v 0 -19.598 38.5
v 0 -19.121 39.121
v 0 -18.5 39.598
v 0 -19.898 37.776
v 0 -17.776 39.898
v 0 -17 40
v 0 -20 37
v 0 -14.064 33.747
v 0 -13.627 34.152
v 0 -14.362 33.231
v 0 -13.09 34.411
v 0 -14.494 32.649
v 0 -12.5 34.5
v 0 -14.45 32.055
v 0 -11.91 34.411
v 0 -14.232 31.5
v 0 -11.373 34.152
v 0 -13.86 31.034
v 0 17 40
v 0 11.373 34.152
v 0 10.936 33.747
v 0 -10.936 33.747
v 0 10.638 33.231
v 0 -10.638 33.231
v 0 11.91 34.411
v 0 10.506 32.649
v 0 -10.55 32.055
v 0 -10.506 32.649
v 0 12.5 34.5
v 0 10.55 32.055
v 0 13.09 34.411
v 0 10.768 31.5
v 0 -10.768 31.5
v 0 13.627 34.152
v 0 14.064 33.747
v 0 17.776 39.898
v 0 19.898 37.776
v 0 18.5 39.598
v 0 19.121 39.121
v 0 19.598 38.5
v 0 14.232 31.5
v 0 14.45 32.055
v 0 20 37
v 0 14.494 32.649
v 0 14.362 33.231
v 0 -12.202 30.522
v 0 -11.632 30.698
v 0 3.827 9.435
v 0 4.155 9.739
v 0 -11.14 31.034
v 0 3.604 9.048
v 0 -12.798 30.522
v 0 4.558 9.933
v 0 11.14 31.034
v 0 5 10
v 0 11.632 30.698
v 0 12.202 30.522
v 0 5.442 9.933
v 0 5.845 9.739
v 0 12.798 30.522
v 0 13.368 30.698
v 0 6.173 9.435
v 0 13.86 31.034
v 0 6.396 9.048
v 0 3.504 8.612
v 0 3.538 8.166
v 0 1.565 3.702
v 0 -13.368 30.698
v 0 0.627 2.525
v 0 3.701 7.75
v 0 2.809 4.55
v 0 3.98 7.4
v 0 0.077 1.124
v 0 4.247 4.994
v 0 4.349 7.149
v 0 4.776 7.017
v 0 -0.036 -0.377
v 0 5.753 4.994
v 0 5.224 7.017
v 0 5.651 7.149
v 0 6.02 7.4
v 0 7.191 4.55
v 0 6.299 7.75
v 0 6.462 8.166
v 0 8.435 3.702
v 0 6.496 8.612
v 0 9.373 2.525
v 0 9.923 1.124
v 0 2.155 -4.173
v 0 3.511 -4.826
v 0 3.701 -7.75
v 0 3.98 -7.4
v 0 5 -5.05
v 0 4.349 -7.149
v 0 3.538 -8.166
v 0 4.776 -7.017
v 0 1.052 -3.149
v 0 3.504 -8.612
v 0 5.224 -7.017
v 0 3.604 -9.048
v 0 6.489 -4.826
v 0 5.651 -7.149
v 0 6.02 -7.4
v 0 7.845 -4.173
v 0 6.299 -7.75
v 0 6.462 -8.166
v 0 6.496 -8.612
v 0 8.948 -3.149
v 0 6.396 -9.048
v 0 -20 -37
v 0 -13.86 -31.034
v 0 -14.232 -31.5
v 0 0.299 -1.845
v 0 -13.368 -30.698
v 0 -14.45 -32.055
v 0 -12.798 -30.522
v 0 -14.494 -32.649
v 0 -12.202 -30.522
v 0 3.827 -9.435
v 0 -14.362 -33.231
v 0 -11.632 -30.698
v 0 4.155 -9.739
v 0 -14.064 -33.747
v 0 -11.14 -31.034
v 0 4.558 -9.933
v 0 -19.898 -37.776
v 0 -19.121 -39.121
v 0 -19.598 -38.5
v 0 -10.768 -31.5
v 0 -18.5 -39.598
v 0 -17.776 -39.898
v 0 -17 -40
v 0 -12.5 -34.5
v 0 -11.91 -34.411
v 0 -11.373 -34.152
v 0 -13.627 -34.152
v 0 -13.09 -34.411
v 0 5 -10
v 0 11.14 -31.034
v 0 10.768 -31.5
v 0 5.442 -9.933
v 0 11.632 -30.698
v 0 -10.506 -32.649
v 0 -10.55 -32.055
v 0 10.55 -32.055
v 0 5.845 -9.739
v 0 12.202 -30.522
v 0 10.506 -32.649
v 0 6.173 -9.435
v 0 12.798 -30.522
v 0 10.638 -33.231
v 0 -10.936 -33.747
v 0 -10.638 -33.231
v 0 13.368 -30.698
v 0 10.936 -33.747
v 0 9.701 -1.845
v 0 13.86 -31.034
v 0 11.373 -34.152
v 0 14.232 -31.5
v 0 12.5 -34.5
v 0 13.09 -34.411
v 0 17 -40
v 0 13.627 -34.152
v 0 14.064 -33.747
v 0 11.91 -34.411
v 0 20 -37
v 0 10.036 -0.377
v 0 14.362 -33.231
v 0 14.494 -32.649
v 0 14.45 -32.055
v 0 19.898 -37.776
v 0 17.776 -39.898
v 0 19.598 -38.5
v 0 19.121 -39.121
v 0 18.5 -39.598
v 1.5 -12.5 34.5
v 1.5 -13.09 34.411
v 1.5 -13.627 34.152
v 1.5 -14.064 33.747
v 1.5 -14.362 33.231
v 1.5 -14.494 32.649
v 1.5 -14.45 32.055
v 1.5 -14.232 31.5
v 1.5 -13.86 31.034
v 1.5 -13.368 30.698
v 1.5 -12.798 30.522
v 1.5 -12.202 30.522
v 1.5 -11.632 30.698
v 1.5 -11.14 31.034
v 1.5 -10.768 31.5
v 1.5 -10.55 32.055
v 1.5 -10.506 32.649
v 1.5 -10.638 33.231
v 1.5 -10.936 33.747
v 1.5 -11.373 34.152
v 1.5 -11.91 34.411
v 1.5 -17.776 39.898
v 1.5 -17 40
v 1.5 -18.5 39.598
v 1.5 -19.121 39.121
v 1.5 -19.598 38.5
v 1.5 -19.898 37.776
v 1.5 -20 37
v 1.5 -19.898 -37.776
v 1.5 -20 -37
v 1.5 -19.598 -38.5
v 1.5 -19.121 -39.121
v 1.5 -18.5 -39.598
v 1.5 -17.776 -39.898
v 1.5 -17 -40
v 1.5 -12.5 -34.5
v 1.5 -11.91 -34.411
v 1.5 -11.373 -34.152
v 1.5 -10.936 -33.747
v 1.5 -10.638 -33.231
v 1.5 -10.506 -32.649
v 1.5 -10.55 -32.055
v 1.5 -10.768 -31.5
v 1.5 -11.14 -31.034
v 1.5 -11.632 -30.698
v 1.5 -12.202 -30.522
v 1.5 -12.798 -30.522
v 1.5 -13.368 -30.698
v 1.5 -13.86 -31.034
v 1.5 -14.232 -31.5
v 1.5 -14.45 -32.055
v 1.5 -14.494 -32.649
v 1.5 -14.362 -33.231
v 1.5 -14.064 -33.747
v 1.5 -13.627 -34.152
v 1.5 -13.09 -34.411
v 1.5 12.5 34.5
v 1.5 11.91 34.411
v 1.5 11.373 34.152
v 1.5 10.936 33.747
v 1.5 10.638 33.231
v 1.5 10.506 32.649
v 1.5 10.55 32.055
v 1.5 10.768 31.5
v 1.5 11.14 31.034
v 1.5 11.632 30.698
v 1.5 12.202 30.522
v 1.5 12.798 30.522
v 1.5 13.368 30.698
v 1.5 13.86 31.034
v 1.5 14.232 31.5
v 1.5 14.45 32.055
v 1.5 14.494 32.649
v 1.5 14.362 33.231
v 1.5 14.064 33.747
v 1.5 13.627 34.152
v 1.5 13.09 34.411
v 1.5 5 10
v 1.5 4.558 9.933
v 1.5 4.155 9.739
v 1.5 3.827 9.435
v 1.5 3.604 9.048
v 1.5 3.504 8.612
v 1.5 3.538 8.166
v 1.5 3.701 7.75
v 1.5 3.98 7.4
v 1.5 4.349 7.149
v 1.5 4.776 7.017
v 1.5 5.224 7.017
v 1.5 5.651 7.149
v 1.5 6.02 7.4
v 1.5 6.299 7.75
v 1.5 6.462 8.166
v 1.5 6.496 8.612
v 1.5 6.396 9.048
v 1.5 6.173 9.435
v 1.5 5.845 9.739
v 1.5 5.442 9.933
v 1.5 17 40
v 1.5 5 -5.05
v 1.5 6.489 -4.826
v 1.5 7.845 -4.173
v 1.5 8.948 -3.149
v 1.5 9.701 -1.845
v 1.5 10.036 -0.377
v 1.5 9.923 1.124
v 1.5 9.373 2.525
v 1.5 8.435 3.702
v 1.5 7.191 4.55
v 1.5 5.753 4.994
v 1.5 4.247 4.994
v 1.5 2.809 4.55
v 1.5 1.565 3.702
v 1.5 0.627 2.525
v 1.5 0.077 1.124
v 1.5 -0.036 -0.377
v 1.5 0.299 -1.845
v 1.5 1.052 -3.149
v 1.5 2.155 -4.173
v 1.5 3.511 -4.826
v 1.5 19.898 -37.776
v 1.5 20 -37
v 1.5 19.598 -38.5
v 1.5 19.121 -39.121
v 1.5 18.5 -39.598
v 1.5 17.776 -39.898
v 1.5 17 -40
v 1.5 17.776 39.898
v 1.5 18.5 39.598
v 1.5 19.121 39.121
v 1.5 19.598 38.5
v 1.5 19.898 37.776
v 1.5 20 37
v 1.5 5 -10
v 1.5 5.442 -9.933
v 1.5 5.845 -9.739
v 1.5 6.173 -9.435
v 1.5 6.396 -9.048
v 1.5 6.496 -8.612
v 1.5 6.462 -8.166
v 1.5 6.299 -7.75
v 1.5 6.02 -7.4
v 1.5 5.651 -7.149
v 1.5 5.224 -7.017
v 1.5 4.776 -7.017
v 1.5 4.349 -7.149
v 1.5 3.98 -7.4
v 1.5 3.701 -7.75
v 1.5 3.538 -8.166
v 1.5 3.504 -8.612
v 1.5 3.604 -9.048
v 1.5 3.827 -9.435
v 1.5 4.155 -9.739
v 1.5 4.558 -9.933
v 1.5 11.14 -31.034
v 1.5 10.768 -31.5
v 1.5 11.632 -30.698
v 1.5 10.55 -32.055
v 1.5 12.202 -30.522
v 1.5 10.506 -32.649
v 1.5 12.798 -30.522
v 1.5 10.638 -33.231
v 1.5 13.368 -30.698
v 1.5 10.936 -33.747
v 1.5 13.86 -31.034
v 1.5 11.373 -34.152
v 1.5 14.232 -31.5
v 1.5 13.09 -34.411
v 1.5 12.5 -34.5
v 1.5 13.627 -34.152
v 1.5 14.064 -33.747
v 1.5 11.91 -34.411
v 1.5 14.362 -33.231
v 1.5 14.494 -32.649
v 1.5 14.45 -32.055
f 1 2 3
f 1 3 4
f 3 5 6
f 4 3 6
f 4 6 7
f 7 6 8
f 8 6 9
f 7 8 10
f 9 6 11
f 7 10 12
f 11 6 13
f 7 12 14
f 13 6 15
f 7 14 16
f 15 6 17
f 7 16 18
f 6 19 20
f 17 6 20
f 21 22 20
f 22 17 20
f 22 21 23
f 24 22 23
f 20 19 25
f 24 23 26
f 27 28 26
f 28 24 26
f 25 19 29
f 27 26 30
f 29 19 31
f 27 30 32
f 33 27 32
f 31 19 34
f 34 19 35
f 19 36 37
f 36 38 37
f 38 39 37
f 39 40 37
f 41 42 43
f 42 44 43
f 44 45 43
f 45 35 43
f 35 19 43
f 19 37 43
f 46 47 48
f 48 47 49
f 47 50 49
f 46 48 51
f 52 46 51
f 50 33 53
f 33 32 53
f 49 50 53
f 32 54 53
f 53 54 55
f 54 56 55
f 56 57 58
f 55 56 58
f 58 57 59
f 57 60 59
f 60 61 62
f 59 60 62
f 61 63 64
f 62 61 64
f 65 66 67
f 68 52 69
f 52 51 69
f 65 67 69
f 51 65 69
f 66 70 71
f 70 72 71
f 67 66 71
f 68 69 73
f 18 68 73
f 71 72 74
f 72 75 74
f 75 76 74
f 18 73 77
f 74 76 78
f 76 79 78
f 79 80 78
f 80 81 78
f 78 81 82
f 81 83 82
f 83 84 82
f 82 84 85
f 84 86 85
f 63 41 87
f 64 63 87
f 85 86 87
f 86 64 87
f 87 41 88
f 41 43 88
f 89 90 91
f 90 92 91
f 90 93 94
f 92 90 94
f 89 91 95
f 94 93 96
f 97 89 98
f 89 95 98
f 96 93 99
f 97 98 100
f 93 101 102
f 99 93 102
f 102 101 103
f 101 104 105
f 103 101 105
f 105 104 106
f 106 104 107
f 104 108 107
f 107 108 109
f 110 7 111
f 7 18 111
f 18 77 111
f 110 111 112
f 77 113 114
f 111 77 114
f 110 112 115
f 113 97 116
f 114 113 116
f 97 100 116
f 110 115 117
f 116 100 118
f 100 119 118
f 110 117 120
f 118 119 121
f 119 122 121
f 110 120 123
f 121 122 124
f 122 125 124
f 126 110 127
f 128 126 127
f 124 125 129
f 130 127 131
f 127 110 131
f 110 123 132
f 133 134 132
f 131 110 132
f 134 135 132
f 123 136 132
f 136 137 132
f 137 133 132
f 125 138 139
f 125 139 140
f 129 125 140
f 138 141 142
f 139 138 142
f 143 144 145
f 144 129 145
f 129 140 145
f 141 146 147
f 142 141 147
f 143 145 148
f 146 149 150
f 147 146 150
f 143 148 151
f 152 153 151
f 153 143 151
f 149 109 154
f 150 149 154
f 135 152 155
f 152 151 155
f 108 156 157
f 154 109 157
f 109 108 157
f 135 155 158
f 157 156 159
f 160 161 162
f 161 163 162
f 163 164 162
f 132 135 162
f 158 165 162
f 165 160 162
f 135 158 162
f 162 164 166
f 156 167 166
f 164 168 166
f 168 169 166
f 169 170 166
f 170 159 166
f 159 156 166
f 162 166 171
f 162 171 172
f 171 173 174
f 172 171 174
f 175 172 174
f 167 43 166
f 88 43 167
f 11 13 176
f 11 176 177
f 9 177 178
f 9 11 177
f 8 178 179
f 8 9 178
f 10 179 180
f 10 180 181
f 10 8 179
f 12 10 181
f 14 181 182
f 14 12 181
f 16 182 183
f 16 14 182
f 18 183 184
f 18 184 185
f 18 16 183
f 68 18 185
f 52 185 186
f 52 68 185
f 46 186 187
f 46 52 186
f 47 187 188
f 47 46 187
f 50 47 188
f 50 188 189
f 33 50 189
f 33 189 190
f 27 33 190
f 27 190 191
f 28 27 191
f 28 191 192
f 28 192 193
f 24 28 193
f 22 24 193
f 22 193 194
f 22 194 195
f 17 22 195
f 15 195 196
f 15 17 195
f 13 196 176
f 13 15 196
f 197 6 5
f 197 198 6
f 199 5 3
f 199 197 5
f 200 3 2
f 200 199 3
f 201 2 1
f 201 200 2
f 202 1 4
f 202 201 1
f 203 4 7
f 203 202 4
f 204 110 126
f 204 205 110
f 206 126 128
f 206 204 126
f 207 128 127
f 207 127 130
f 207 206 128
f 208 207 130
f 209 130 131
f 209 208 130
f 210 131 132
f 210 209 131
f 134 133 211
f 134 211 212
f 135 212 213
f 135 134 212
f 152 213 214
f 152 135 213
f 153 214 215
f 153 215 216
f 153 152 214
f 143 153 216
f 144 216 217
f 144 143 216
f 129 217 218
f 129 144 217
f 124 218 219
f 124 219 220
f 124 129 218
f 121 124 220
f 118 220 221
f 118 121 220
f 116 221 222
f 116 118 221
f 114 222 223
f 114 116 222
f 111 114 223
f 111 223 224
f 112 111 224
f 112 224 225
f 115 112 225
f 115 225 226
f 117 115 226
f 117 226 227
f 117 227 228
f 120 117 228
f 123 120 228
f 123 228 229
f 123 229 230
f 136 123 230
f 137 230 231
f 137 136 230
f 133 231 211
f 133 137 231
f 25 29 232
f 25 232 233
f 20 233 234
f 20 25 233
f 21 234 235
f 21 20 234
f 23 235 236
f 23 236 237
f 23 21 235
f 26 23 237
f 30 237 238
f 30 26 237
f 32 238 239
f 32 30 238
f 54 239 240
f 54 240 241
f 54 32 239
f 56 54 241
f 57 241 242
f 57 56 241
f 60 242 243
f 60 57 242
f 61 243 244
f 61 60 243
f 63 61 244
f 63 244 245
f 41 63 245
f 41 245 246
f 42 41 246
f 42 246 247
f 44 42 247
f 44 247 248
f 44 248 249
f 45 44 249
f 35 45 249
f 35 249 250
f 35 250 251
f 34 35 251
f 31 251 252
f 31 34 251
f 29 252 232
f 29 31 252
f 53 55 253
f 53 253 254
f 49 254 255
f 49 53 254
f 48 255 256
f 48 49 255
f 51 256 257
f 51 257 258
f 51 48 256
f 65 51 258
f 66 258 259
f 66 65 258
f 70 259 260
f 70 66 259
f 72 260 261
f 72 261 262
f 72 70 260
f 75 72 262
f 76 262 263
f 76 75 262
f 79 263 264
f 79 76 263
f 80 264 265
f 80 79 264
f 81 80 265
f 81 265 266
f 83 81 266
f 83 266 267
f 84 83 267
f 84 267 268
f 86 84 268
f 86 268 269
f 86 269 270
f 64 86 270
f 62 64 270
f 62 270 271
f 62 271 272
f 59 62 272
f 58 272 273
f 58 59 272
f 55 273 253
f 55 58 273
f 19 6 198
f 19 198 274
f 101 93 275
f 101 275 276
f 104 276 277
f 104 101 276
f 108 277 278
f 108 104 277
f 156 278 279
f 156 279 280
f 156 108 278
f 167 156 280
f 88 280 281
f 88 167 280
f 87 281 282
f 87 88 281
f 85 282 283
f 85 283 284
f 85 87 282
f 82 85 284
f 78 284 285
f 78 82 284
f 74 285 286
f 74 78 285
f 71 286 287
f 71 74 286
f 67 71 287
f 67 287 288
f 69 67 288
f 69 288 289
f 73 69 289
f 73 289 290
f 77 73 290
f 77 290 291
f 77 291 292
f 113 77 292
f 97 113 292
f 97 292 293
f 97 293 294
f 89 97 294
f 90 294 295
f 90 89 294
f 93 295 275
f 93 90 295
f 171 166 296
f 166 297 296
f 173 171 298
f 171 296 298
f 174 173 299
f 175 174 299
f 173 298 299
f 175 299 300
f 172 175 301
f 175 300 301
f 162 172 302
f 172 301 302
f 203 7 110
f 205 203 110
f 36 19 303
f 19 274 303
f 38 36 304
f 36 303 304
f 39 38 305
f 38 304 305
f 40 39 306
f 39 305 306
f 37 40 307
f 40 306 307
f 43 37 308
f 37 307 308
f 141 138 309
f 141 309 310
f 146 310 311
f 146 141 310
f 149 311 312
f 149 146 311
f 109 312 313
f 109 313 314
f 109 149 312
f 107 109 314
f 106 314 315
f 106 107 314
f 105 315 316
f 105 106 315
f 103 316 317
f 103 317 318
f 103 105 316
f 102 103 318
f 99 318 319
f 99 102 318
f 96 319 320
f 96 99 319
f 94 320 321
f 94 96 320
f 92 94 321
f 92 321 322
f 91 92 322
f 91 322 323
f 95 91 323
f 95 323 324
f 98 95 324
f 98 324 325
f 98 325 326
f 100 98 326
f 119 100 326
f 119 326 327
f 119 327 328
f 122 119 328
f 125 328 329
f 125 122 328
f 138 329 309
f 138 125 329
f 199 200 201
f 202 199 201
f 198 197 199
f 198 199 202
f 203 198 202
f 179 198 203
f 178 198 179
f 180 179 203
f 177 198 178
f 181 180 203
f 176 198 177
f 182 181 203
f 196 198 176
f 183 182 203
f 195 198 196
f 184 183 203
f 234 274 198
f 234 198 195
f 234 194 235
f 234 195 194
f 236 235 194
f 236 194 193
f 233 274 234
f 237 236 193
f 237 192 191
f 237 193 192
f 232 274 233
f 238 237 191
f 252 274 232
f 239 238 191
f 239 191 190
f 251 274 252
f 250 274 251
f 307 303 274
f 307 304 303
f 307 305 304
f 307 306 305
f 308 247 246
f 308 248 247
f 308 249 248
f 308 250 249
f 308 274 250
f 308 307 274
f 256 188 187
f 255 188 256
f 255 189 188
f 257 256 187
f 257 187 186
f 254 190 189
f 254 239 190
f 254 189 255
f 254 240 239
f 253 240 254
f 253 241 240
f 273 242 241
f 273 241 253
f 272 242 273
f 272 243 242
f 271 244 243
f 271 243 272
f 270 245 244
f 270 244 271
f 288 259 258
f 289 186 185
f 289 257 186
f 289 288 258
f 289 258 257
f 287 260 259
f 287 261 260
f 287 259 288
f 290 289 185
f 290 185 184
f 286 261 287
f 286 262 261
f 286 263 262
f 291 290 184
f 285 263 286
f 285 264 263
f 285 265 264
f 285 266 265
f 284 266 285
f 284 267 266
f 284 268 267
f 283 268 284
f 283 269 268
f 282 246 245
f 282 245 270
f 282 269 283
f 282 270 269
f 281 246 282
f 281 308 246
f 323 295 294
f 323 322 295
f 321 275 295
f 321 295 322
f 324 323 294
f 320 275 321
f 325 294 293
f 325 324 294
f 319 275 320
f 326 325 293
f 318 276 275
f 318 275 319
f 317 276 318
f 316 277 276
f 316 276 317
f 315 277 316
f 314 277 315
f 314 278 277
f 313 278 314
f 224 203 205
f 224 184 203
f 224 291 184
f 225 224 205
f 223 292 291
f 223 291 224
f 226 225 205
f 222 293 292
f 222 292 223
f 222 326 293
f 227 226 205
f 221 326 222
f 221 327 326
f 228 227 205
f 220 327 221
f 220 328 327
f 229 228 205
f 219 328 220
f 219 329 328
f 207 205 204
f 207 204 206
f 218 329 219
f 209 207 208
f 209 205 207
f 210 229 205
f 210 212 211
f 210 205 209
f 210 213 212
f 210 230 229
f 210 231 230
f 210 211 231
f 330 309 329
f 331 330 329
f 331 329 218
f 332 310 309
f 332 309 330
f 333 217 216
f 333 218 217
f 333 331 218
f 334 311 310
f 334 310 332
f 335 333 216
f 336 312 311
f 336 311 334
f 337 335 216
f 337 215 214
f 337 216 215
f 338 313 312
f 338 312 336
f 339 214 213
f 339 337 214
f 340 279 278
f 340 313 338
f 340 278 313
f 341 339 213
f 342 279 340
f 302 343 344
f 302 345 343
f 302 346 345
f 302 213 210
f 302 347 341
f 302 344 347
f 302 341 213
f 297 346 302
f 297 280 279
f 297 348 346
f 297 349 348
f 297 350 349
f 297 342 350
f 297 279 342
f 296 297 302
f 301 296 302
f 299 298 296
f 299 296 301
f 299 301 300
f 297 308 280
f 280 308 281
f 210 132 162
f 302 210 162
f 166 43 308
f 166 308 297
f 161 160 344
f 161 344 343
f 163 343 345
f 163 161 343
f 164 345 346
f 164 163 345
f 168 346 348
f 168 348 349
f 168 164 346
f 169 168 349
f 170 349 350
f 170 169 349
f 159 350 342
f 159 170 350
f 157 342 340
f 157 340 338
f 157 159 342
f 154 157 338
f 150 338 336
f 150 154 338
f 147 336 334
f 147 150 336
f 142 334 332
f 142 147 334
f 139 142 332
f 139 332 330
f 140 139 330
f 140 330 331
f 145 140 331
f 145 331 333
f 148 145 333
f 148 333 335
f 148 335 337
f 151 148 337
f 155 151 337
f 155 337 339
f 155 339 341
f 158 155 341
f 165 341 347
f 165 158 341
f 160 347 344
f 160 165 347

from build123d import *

# Parameters (mm, degrees)
SKETCH_1_W      = 80
SKETCH_1_H      = 40
SKETCH_1_R      = 2
SKETCH_1_R_2    = 5.05
SKETCH_1_R_3    = 1.5
EXTRUDE_1_DEPTH = 1.5
FILLET_1_R      = 3


with BuildPart() as part:
    # ｽｹｯﾁ1 → ﾎﾞｽ - 押し出し1 (new body)
    with BuildSketch(Plane(origin=(0, 0, 0), x_dir=(0, 0, -1), z_dir=(1, 0, 0))):
        Rectangle(SKETCH_1_W, SKETCH_1_H)
        with Locations((32.5, 12.5)):
            Circle(SKETCH_1_R, mode=Mode.SUBTRACT)
        with Locations(Location((-32.5, 12.5, 0), (0, 0, 180))):
            Circle(SKETCH_1_R, mode=Mode.SUBTRACT)
        with Locations((32.5, -12.5)):
            Circle(SKETCH_1_R, mode=Mode.SUBTRACT)
        with Locations((0, 5)):
            Circle(SKETCH_1_R_2, mode=Mode.SUBTRACT)
        with Locations(Location((-32.5, -12.5, 0), (0, 0, 180))):
            Circle(SKETCH_1_R, mode=Mode.SUBTRACT)
        with Locations((8.5, 5)):
            Circle(SKETCH_1_R_3, mode=Mode.SUBTRACT)
        with Locations(Location((-8.5, 5, 0), (0, 0, 180))):
            Circle(SKETCH_1_R_3, mode=Mode.SUBTRACT)
    extrude(amount=EXTRUDE_1_DEPTH)

    # ﾌｨﾚｯﾄ1
    fillet_1_edges = [part.edges().sort_by_distance(p)[0] for p in [
        (0.75, -20, -40),
        (0.75, -20, 40),
        (0.75, 20, 40),
        (0.75, 20, -40),
    ]]
    fillet(fillet_1_edges, radius=FILLET_1_R)


solid = part.part
